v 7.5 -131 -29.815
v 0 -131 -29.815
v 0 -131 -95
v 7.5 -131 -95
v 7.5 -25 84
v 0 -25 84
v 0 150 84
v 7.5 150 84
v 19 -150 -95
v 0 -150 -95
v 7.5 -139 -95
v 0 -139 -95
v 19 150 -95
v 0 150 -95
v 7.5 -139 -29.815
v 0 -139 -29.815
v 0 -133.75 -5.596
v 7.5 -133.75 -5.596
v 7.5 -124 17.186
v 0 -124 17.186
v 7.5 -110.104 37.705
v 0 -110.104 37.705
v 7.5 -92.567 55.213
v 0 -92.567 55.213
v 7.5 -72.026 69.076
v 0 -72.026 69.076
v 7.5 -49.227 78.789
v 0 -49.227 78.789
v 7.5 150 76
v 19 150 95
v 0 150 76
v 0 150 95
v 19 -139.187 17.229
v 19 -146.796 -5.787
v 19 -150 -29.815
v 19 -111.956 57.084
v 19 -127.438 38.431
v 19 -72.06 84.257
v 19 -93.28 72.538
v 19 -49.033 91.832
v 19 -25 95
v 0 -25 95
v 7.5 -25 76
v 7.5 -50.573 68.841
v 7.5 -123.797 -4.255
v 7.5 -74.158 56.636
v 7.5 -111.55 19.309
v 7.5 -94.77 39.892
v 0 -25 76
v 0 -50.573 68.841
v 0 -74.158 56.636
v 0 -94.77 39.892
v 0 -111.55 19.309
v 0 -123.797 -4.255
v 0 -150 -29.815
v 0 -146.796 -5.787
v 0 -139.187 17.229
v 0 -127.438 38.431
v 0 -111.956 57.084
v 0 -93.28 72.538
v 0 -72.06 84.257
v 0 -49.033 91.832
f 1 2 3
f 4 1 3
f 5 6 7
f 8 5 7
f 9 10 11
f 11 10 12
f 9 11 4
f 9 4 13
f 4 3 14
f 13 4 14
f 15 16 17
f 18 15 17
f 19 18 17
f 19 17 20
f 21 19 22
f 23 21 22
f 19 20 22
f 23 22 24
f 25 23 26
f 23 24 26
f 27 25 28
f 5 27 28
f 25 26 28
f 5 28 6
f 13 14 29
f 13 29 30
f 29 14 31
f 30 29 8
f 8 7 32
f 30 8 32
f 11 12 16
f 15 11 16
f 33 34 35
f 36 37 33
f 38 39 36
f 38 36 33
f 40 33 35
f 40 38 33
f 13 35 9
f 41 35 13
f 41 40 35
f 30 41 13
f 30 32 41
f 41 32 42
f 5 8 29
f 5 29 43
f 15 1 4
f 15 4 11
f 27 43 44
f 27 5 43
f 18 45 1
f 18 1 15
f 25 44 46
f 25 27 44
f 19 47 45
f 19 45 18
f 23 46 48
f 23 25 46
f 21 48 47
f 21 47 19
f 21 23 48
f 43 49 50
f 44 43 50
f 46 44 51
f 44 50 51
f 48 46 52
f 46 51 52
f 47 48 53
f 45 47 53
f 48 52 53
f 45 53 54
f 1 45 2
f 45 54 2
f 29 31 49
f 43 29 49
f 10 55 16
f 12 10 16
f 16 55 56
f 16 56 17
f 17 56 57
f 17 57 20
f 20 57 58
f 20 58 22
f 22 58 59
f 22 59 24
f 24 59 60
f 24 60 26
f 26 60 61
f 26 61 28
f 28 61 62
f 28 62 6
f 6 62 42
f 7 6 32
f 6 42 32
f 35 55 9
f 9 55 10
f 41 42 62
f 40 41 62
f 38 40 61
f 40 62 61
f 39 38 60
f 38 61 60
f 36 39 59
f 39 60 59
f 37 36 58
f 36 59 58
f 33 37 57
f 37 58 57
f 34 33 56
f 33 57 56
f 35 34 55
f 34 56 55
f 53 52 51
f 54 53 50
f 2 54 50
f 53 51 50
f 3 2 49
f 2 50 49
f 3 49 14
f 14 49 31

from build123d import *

# Parameters (mm, degrees)
F1_DEPTH = 19
F3_DEPTH = 7.5


with BuildPart() as f1:
    # F0 (on Right) → F1 (new body)
    with BuildSketch(Plane.YZ):
        with BuildLine():
            Line((150, 95), (-25, 95))
            ThreePointArc((-25, 95), (-111.955644, 57.084235), (-150, -29.815225))
            Line((-150, -29.815225), (-150, -40))
            Line((-150, -40), (-150, -95))
            Line((-150, -95), (150, -95))
            Line((150, -95), (150, 95))
        make_face()
    extrude(amount=F1_DEPTH)

    # F2 (on face) → F3 (cut)
    with BuildSketch(Plane(origin=(0, 0, 0), x_dir=(0, -1, 0), z_dir=(-1, 0, 0))):
        with BuildLine():
            Line((25, 84), (-150, 84))
            Line((-150, 84), (-150, 76))
            Line((-150, 76), (25, 76))
            ThreePointArc((25, 76), (94.770081, 39.891752), (131, -29.815225))
            Line((131, -29.815225), (131, -95))
            Line((131, -95), (139, -95))
            Line((139, -95), (139, -29.815225))
            ThreePointArc((139, -29.815225), (101.75341, 46.877867), (25, 84))
        make_face()
    extrude(amount=-F3_DEPTH, mode=Mode.SUBTRACT)


solid = f1.part
